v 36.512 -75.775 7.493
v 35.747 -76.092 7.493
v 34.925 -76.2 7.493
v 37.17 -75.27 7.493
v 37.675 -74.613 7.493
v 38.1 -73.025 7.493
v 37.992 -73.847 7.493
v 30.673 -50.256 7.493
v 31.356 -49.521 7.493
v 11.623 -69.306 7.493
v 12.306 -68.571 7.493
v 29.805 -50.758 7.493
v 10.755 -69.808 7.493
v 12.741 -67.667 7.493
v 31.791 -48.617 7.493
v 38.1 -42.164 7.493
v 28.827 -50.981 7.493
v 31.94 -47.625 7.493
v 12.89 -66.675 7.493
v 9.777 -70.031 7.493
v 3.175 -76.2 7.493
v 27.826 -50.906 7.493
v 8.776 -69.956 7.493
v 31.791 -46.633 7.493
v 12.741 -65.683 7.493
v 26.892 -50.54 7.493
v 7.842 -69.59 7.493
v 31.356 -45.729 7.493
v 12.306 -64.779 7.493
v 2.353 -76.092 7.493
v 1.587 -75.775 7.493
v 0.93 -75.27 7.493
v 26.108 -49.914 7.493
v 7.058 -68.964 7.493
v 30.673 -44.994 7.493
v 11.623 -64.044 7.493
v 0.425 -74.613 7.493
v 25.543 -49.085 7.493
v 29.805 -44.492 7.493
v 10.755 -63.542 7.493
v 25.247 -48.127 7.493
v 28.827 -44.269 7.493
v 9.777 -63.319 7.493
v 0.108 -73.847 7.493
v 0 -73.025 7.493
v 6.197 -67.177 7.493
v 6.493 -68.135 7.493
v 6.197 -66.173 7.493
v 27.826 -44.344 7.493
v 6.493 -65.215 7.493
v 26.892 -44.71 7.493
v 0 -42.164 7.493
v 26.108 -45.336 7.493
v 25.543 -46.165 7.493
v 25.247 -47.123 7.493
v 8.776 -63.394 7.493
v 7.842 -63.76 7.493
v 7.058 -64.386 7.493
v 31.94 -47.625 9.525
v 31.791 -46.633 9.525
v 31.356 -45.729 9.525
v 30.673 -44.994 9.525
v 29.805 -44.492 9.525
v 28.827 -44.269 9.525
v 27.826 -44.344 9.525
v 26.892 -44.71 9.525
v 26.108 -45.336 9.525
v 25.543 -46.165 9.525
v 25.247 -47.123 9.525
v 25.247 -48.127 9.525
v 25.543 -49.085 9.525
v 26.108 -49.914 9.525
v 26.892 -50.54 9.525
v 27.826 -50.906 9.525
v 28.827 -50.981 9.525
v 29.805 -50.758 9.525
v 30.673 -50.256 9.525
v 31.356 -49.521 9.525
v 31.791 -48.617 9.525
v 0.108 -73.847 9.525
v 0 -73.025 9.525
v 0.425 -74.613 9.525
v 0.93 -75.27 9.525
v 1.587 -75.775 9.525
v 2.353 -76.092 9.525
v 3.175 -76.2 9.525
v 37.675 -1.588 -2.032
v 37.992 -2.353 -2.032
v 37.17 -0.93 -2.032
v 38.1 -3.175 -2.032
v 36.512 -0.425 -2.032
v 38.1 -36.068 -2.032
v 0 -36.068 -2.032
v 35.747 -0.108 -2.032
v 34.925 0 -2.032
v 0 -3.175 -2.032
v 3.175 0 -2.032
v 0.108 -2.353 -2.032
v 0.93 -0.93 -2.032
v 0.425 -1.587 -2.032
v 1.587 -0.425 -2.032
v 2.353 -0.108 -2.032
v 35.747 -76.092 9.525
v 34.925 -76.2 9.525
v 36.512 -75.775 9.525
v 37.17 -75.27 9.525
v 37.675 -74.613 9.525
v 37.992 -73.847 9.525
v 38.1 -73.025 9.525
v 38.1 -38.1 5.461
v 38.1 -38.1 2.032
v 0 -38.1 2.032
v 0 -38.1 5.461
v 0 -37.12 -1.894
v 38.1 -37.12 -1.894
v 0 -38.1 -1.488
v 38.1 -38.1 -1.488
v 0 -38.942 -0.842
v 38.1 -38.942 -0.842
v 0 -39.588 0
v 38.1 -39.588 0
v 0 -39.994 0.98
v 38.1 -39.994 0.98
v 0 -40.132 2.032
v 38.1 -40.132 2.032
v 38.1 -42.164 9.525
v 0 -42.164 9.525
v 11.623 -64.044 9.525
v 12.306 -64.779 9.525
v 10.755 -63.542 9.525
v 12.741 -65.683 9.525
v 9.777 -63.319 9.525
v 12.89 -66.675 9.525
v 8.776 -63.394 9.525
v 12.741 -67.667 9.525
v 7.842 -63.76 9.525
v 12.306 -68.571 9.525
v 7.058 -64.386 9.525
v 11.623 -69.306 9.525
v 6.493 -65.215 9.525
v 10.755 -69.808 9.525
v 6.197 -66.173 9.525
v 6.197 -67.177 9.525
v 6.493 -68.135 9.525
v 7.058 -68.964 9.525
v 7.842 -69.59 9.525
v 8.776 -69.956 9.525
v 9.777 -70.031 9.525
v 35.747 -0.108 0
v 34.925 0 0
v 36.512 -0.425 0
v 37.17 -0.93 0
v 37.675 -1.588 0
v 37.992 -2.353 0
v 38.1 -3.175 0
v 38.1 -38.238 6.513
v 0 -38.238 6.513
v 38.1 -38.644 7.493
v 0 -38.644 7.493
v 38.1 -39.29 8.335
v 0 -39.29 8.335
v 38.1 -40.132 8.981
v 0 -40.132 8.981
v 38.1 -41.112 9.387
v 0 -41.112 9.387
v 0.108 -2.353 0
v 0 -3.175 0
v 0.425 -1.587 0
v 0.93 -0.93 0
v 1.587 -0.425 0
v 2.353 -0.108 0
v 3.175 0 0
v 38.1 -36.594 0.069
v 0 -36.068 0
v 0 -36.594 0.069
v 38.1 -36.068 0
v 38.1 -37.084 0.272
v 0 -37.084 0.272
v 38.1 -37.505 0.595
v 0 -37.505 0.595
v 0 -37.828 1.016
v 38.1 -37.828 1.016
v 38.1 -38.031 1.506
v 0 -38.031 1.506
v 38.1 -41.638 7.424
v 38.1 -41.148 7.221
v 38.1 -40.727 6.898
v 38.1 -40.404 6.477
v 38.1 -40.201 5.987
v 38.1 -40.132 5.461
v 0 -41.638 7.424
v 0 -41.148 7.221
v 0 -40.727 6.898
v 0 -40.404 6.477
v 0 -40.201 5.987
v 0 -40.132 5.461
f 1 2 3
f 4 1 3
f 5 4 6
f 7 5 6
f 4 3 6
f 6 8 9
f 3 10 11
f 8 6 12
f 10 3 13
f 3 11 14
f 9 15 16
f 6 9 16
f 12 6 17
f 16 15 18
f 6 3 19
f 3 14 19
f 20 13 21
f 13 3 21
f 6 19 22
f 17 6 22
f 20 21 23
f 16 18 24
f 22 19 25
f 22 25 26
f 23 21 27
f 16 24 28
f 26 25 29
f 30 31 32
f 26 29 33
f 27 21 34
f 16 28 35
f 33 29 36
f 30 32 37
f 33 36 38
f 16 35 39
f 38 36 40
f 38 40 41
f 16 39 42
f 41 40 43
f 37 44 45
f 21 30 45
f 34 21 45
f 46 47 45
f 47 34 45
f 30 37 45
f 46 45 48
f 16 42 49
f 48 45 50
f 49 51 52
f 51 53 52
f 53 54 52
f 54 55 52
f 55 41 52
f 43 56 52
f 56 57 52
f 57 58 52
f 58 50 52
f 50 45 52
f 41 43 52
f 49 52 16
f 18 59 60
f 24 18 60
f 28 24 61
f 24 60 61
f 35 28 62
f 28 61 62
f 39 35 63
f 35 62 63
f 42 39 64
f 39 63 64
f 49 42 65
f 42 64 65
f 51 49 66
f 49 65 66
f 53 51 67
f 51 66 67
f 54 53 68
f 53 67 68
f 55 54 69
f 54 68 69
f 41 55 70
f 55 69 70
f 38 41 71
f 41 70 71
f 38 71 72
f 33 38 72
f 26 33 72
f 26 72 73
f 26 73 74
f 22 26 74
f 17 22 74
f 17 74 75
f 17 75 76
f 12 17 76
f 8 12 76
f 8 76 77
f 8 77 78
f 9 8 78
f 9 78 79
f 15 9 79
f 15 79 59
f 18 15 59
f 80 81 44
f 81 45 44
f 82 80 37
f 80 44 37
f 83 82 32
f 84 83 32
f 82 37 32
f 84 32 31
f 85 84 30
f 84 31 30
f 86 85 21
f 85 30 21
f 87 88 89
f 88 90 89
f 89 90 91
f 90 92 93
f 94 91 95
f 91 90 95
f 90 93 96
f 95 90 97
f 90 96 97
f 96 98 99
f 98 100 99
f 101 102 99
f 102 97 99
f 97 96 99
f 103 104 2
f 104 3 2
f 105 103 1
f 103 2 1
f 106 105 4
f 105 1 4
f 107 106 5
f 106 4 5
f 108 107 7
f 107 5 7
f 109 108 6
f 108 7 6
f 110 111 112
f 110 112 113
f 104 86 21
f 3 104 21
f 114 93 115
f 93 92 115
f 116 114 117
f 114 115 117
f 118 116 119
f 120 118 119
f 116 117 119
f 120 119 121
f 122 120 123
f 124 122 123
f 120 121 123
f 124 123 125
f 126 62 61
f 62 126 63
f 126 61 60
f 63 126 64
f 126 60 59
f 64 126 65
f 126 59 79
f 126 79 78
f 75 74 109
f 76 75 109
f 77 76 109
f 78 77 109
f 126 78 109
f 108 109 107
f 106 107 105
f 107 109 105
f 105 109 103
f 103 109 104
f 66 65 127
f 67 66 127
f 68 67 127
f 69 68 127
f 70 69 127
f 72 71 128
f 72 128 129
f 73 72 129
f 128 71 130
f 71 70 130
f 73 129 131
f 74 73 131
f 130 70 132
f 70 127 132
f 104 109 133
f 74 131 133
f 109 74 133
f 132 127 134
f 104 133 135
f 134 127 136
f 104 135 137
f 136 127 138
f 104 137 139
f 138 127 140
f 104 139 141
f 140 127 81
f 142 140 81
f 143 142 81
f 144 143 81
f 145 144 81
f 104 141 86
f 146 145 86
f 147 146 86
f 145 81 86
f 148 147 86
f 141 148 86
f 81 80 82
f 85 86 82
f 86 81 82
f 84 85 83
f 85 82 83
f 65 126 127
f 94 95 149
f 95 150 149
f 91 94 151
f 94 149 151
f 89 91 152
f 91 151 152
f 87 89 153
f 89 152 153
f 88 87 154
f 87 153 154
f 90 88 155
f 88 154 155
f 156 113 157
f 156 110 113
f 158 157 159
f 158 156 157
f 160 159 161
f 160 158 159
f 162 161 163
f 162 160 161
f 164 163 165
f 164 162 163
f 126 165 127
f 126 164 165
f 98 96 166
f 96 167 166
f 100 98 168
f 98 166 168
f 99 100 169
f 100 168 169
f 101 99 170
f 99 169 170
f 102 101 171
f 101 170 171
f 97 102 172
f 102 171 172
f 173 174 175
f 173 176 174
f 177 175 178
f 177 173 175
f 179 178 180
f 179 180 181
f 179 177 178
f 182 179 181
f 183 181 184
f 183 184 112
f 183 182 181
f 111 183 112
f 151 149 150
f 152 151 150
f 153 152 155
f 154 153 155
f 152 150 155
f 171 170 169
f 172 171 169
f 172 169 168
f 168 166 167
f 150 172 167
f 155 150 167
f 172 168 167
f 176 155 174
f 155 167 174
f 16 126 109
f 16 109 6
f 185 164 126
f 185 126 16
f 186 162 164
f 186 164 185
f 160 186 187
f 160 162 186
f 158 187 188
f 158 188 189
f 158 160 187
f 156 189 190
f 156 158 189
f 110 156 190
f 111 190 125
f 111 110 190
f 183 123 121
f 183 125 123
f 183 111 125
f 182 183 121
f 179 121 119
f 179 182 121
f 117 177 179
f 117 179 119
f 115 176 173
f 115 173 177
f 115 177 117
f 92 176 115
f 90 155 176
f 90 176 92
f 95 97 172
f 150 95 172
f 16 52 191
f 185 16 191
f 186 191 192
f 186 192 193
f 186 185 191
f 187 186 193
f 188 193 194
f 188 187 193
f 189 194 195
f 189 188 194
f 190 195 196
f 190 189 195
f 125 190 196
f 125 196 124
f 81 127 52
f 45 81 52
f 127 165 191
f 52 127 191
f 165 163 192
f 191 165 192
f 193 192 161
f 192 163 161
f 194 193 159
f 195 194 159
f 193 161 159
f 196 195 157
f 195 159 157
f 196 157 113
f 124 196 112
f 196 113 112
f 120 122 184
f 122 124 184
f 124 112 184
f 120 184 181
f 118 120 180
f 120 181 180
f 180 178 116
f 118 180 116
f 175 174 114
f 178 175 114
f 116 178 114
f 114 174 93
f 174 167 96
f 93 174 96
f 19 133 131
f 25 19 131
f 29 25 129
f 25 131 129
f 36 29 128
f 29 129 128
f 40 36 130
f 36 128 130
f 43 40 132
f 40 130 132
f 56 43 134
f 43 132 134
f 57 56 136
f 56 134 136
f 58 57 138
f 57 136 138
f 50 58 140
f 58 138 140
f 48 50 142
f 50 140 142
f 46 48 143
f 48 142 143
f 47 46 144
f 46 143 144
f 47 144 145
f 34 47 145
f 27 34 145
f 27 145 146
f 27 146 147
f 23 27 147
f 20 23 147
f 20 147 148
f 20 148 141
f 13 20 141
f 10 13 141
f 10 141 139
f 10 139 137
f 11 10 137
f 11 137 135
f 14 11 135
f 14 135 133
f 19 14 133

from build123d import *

# Parameters (mm, degrees)
BOSS_EXTRUDE1_DEPTH = 38.1
FILLET1_R           = 2.032
FILLET2_R           = 4.064
FILLET3_R           = 3.175
SKETCH2_R           = 3.3655
CUT_EXTRUDE1_DEPTH  = 12.557


with BuildPart() as part:
    # Sketch1 → Boss-Extrude1 (new body)
    with BuildSketch(Plane(origin=(0, 0, 0), x_dir=(0, 0, -1), z_dir=(1, 0, 0))):
        Polygon((0, 0), (0, -38.1), (-9.525, -38.1), (-9.525, -76.2), (-7.493, -76.2), (-7.493, -40.132), (2.032, -40.132), (2.032, 0), align=None)
    extrude(amount=BOSS_EXTRUDE1_DEPTH)

    # Fillet1
    fillet1_edges = [part.edges().sort_by_distance(p)[0] for p in [
        (19.05, -40.132, 7.493),
        (19.05, -38.1, 0),
    ]]
    fillet(fillet1_edges, radius=FILLET1_R)

    # Fillet2
    fillet2_edges = [part.edges().sort_by_distance(p)[0] for p in [
        (19.05, -40.132, -2.032),
        (19.05, -38.1, 9.525),
    ]]
    fillet(fillet2_edges, radius=FILLET2_R)

    # Fillet3
    fillet3_edges = [part.edges().sort_by_distance(p)[0] for p in [
        (0, 0, -1.016),
        (38.1, -76.2, 8.509),
        (38.1, 0, -1.016),
        (0, -76.2, 8.509),
    ]]
    fillet(fillet3_edges, radius=FILLET3_R)

    # Sketch2 → Cut-Extrude1 (cut, through all)
    with BuildSketch(Plane.XY.offset(9.525)):
        with Locations((9.525, -66.675)):
            Circle(SKETCH2_R)
        with Locations((28.575, -47.625)):
            Circle(SKETCH2_R)
    extrude(amount=-CUT_EXTRUDE1_DEPTH, mode=Mode.SUBTRACT)


solid = part.part
